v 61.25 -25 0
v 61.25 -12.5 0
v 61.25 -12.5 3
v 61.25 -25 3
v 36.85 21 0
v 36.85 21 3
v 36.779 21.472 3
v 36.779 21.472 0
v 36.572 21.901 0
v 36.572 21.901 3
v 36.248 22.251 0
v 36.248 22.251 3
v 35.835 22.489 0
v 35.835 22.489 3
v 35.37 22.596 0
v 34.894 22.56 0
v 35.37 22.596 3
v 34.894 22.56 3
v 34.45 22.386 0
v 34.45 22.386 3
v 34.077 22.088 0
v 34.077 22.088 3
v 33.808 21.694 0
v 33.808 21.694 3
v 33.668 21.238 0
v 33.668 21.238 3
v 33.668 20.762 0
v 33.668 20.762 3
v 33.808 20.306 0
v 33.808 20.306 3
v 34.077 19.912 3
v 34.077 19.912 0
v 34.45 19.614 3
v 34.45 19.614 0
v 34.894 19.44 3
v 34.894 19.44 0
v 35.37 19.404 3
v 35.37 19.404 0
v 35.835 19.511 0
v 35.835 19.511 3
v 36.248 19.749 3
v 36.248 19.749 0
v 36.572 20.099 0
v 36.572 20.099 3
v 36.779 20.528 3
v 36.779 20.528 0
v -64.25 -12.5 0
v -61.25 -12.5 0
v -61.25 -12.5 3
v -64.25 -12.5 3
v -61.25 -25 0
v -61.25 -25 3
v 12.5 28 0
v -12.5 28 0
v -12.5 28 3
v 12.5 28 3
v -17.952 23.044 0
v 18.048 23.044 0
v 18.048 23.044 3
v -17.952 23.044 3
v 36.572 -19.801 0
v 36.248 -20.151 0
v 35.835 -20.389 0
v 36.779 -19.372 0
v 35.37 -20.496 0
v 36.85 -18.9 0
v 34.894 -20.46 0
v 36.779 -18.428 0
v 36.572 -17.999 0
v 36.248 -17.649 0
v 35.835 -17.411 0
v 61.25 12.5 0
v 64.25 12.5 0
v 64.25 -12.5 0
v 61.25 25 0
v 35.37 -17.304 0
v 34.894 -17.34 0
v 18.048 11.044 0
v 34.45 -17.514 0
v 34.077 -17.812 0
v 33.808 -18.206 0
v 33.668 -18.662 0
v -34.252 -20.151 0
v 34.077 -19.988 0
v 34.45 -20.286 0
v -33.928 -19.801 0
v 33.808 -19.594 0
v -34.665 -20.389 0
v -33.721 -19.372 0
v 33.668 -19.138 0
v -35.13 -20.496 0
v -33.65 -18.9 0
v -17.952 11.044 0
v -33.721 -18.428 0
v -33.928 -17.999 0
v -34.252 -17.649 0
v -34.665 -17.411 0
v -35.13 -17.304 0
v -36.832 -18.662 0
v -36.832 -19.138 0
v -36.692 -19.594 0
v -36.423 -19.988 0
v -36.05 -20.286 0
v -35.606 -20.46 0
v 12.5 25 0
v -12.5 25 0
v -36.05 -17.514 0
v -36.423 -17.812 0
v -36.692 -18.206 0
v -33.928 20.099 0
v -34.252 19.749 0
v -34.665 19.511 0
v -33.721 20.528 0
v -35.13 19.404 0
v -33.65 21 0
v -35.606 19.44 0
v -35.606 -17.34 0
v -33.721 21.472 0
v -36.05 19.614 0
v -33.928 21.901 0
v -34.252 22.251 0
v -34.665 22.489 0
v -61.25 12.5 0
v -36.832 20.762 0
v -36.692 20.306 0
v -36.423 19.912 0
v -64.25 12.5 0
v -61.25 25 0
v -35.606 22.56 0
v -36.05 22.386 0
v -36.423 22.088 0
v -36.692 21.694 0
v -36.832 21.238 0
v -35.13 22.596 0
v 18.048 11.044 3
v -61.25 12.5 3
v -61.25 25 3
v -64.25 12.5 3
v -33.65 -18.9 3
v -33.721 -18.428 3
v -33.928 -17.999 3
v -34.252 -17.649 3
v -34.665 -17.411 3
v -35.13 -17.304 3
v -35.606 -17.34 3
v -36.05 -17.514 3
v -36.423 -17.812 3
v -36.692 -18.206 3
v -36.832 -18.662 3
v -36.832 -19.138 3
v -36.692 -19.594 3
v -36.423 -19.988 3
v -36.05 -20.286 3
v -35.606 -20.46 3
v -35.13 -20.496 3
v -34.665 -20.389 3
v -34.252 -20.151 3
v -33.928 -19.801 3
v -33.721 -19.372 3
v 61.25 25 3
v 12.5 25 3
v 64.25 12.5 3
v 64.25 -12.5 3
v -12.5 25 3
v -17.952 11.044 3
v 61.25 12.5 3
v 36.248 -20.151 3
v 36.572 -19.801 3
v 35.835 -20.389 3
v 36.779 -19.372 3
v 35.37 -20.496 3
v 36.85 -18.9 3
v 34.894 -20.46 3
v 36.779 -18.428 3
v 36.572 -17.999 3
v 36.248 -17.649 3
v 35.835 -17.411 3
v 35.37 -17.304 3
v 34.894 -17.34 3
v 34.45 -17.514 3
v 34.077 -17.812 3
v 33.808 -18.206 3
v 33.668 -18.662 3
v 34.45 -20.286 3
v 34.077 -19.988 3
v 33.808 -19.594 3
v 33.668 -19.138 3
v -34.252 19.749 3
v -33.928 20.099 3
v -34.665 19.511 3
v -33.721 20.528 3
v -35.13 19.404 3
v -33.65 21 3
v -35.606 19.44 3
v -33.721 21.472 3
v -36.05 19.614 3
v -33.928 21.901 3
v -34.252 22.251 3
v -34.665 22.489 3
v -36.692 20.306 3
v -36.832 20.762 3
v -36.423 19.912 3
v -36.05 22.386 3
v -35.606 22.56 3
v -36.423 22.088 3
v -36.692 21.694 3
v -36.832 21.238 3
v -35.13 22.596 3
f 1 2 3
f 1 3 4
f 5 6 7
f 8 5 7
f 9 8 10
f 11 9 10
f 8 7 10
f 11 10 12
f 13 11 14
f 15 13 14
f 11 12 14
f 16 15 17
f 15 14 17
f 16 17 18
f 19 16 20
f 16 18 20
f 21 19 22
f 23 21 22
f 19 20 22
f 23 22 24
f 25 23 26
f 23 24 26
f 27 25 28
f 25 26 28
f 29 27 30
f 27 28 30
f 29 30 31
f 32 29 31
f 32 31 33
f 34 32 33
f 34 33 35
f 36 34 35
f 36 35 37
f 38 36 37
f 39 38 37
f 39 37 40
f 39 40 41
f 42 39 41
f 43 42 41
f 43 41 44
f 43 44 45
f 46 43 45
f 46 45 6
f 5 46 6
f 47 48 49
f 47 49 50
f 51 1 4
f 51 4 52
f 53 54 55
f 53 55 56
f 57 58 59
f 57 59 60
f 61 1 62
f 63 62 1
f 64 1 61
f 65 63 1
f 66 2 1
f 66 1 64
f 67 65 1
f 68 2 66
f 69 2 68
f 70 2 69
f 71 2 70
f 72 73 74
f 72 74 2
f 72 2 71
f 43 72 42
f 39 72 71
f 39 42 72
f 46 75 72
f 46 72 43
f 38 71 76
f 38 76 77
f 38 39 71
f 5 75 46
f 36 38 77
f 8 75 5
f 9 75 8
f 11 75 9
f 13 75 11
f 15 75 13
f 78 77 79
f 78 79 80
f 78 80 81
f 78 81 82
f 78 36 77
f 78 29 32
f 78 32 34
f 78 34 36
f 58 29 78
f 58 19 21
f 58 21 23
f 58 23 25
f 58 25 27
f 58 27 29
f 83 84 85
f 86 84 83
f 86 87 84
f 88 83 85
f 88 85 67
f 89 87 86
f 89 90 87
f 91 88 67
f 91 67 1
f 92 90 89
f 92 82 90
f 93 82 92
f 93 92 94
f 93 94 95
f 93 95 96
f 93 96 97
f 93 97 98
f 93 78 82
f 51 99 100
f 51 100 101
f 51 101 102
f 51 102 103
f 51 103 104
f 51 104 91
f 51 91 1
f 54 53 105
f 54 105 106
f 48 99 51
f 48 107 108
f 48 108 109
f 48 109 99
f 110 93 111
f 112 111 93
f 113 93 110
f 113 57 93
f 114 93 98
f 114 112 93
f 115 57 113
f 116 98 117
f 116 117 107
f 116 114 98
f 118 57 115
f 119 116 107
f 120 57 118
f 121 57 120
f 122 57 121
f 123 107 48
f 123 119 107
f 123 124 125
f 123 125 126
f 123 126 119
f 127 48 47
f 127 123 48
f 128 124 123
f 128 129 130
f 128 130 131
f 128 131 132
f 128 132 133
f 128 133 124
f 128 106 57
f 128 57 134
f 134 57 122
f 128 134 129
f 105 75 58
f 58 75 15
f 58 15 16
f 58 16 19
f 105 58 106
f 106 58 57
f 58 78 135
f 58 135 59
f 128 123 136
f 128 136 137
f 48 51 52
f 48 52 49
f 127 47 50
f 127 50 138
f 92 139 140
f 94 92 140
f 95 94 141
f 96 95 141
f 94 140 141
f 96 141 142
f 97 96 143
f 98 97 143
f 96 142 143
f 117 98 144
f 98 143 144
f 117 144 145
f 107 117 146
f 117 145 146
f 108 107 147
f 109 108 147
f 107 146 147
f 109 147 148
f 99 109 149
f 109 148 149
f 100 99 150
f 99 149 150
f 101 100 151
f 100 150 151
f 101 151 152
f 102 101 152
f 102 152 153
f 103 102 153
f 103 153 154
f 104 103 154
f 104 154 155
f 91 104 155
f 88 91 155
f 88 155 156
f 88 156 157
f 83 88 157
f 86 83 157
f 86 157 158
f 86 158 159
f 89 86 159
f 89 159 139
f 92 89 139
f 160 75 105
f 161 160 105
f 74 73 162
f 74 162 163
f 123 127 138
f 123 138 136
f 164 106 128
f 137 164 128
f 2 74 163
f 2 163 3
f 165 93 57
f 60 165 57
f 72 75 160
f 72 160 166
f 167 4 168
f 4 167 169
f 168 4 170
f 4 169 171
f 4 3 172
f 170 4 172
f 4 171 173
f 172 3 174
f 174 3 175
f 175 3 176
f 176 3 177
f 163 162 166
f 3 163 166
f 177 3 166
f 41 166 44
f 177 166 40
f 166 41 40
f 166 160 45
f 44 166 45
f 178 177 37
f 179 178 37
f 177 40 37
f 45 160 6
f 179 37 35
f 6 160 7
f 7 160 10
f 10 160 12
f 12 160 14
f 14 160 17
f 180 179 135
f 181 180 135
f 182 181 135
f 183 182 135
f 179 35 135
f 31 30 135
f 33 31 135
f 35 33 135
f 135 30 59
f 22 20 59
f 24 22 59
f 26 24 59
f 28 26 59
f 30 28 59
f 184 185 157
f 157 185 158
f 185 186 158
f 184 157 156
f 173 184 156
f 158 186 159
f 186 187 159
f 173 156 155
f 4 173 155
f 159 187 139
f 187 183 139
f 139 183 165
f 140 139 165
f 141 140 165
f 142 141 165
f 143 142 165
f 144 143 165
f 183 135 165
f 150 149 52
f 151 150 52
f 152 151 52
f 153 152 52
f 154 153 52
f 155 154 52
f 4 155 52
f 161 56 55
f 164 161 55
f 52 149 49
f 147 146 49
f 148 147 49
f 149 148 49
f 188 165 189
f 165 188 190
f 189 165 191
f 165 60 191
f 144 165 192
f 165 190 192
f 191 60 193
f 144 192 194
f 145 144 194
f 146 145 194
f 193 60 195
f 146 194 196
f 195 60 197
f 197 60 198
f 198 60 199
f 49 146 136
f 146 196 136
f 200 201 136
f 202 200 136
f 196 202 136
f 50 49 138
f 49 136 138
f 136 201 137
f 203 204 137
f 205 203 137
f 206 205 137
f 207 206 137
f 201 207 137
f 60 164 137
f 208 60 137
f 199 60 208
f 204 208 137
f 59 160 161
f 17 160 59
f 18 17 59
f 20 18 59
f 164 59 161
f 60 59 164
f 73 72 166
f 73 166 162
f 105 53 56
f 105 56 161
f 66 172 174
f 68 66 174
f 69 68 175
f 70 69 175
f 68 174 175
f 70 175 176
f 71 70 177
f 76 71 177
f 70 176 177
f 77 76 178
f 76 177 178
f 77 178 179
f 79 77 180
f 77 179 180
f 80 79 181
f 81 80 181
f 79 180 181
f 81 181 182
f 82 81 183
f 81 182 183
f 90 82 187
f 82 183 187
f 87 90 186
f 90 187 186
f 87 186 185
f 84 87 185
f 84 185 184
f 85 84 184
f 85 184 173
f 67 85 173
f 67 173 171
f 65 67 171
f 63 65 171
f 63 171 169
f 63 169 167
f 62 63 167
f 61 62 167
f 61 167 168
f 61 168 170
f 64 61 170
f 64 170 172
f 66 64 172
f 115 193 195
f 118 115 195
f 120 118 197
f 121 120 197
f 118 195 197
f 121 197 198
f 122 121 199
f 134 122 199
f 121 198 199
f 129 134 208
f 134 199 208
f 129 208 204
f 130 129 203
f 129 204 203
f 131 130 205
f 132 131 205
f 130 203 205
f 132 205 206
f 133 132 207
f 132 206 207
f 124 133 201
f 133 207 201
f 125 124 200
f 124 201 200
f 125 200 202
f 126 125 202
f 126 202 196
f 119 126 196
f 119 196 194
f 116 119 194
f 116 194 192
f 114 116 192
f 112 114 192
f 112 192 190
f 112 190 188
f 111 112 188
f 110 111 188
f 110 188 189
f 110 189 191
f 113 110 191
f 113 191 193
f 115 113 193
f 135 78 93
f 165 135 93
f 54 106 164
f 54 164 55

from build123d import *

# Parameters (mm, degrees)
BOSS_EXTRU_1_DEPTH      = 3
ESQUISSE3_W             = 36
ESQUISSE3_H             = 12
ENL_V_MAT_EXTRU_1_DEPTH = 4
SKETCH1_R               = 1.6
CUT_EXTRUDE1_DEPTH      = 71.150285103
SKETCH2_R               = 1.6
CUT_EXTRUDE2_DEPTH      = 71.150285103
SKETCH3_R               = 1.6
CUT_EXTRUDE3_DEPTH      = 71.150285103


with BuildPart() as part:
    # Esquisse1 → Boss.-Extru.1 (new body)
    with BuildSketch(Plane.XY):
        Polygon((61.25, -25), (-61.25, -25), (-61.25, -12.5), (-64.25, -12.5), (-64.25, 12.5), (-61.25, 12.5), (-61.25, 25), (-29.85, 25), (-26.65, 25), (-12.5, 25), (-12.5, 28), (12.5, 28), (12.5, 25), (26.65, 25), (29.85, 25), (61.25, 25), (61.25, 12.5), (64.25, 12.5), (64.25, -12.5), (61.25, -12.5), align=None)
    extrude(amount=BOSS_EXTRU_1_DEPTH)

    # Esquisse3 → Enlèv. mat.-Extru.1 (cut)
    with BuildSketch(Plane(origin=(0, 0, 0), x_dir=(-1, 0, 0), z_dir=(0, 0, -1))):
        with Locations((-0.047688523, 17.043645632)):
            Rectangle(ESQUISSE3_W, ESQUISSE3_H)
    extrude(amount=-ENL_V_MAT_EXTRU_1_DEPTH, mode=Mode.SUBTRACT)

    # Sketch1 → Cut-Extrude1 (cut, through all)
    with BuildSketch(Plane.XY.offset(3)):
        with Locations((35.25, 21)):
            Circle(SKETCH1_R)
    extrude(amount=-CUT_EXTRUDE1_DEPTH, mode=Mode.SUBTRACT)

    # Sketch2 → Cut-Extrude2 (cut, through all)
    with BuildSketch(Plane.XY.offset(3)):
        with Locations((-35.25, 21)):
            Circle(SKETCH2_R)
    extrude(amount=-CUT_EXTRUDE2_DEPTH, mode=Mode.SUBTRACT)

    # Sketch3 → Cut-Extrude3 (cut, through all)
    with BuildSketch(Plane.XY.offset(3)):
        with Locations((-35.25, -18.9)):
            Circle(SKETCH3_R)
        with Locations((35.25, -18.9)):
            Circle(SKETCH3_R)
    extrude(amount=-CUT_EXTRUDE3_DEPTH, mode=Mode.SUBTRACT)


solid = part.part
